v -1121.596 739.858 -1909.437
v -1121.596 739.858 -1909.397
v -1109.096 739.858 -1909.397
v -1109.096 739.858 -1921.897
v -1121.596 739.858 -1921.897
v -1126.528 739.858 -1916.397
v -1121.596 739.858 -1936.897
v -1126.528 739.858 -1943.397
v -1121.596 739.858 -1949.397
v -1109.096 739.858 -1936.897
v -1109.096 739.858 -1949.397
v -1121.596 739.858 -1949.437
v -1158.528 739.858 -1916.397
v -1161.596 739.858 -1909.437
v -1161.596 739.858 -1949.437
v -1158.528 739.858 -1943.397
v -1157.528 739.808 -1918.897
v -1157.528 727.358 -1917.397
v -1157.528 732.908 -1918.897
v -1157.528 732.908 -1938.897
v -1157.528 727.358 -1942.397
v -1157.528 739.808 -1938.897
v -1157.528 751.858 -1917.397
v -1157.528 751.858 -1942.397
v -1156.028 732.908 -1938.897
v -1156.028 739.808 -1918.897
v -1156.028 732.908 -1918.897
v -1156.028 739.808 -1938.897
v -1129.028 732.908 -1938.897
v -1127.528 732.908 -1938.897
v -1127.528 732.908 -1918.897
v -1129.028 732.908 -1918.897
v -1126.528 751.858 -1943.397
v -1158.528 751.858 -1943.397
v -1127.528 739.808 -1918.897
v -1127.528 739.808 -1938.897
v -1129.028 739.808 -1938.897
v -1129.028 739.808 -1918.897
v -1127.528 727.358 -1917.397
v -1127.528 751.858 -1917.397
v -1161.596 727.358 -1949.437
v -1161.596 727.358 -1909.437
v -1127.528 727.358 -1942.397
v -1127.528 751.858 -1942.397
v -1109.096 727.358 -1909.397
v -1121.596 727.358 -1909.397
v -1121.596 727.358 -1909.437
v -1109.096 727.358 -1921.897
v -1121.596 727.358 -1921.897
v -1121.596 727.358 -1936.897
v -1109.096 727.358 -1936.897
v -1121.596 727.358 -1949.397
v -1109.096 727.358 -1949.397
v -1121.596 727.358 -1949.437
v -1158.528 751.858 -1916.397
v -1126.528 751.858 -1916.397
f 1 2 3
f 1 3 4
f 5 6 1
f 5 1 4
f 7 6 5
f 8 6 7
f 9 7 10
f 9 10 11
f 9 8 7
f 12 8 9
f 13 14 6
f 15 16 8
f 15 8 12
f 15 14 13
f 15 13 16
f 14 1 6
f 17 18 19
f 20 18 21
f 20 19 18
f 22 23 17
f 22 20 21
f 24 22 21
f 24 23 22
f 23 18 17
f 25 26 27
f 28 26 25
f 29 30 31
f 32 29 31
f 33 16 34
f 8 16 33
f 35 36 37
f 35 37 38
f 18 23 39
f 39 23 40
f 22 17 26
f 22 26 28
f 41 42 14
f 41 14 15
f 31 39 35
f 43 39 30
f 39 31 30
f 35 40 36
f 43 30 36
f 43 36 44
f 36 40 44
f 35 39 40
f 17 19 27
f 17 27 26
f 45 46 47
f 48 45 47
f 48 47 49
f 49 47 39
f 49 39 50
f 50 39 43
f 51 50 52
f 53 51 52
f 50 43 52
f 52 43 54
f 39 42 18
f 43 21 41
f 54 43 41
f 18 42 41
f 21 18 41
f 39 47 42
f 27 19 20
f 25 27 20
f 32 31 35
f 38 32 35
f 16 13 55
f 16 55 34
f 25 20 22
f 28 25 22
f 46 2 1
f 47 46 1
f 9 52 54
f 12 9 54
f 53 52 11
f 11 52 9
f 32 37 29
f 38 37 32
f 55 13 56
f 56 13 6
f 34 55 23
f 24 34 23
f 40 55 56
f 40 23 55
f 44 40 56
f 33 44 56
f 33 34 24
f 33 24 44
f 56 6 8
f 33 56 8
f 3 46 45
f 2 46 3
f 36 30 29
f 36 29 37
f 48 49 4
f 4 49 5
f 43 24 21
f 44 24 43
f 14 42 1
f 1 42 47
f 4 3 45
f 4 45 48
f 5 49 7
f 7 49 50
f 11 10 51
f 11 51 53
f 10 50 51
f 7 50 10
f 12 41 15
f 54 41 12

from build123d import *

# Parameters (mm, degrees)
SKETCH3_W           = 4000
SKETCH3_H           = 4000
BOSS_EXTRUDE1_DEPTH = 1250
SKETCH4_W           = 3200
SKETCH4_H           = 2700
BOSS_EXTRUDE2_DEPTH = 1200
SKETCH6_W           = 3000
SKETCH6_H           = 2500
CUT_EXTRUDE1_DEPTH  = 6011.745093863
SKETCH9_W           = 2000
SKETCH9_H           = 690
BOSS_EXTRUDE8_DEPTH = 150
SKETCH8_W           = 2000
SKETCH8_H           = 690
BOSS_EXTRUDE9_DEPTH = 150
SKETCH13_W          = 1250
SKETCH13_H          = 1250
BOSS_EXTRUDE5_DEPTH = 1250
SKETCH14_W          = 1250
SKETCH14_H          = 1250
BOSS_EXTRUDE6_DEPTH = 1250
SCALE1_SCALE        = 0.01


with BuildPart() as part:
    # Sketch3 → Boss-Extrude1 (new body)
    with BuildSketch(Plane(origin=(0, 0, 0), x_dir=(1, 0, 0), z_dir=(0, 1, 0))):
        with Locations((-1806.81348539, 1954.077347606)):
            Rectangle(SKETCH3_W, SKETCH3_H)
    extrude(amount=BOSS_EXTRUDE1_DEPTH)

    # Sketch4 → Boss-Extrude2 (add)
    with BuildSketch(Plane(origin=(0, 1250, 0), x_dir=(1, 0, 0), z_dir=(0, 1, 0))):
        with Locations((-1900, 2000)):
            Rectangle(SKETCH4_W, SKETCH4_H)
    extrude(amount=BOSS_EXTRUDE2_DEPTH)

    # Sketch6 → Cut-Extrude1 (cut, through all)
    with BuildSketch(Plane(origin=(0, 2450, 0), x_dir=(1, 0, 0), z_dir=(0, 1, 0))):
        with Locations((-1900, 2000)):
            Rectangle(SKETCH6_W, SKETCH6_H)
    extrude(amount=-CUT_EXTRUDE1_DEPTH, mode=Mode.SUBTRACT)

    # Sketch9 → Boss-Extrude8 (add)
    with BuildSketch(Plane.ZY.offset(400)):
        with Locations((-1900, 900)):
            Rectangle(SKETCH9_W, SKETCH9_H)
    extrude(amount=BOSS_EXTRUDE8_DEPTH)

    # Sketch8 → Boss-Extrude9 (add)
    with BuildSketch(Plane(origin=(-3400, 0, 0), x_dir=(0, 0, -1), z_dir=(1, 0, 0))):
        with Locations((1900, 900)):
            Rectangle(SKETCH8_W, SKETCH8_H)
    extrude(amount=BOSS_EXTRUDE9_DEPTH)

    # Sketch13 → Boss-Extrude5 (add)
    with BuildSketch(Plane(origin=(193.18651461, 0, 0), x_dir=(0, 0, -1), z_dir=(1, 0, 0))):
        with Locations((575, 625)):
            Rectangle(SKETCH13_W, SKETCH13_H)
    extrude(amount=BOSS_EXTRUDE5_DEPTH)

    # Sketch14 → Boss-Extrude6 (add)
    with BuildSketch(Plane(origin=(193.18651461, 0, 0), x_dir=(0, 0, -1), z_dir=(1, 0, 0))):
        with Locations((3325, 625)):
            Rectangle(SKETCH14_W, SKETCH14_H)
    extrude(amount=BOSS_EXTRUDE6_DEPTH)


with BuildPart() as part_1:
    # Scale1: scaled about (-1134.876780231, 734.705300906, -1929.188509471)
    add(part.part.scale(SCALE1_SCALE).moved(Location((-1123.528012429, 727.358247897, -1909.896624376))))


solid = part_1.part
